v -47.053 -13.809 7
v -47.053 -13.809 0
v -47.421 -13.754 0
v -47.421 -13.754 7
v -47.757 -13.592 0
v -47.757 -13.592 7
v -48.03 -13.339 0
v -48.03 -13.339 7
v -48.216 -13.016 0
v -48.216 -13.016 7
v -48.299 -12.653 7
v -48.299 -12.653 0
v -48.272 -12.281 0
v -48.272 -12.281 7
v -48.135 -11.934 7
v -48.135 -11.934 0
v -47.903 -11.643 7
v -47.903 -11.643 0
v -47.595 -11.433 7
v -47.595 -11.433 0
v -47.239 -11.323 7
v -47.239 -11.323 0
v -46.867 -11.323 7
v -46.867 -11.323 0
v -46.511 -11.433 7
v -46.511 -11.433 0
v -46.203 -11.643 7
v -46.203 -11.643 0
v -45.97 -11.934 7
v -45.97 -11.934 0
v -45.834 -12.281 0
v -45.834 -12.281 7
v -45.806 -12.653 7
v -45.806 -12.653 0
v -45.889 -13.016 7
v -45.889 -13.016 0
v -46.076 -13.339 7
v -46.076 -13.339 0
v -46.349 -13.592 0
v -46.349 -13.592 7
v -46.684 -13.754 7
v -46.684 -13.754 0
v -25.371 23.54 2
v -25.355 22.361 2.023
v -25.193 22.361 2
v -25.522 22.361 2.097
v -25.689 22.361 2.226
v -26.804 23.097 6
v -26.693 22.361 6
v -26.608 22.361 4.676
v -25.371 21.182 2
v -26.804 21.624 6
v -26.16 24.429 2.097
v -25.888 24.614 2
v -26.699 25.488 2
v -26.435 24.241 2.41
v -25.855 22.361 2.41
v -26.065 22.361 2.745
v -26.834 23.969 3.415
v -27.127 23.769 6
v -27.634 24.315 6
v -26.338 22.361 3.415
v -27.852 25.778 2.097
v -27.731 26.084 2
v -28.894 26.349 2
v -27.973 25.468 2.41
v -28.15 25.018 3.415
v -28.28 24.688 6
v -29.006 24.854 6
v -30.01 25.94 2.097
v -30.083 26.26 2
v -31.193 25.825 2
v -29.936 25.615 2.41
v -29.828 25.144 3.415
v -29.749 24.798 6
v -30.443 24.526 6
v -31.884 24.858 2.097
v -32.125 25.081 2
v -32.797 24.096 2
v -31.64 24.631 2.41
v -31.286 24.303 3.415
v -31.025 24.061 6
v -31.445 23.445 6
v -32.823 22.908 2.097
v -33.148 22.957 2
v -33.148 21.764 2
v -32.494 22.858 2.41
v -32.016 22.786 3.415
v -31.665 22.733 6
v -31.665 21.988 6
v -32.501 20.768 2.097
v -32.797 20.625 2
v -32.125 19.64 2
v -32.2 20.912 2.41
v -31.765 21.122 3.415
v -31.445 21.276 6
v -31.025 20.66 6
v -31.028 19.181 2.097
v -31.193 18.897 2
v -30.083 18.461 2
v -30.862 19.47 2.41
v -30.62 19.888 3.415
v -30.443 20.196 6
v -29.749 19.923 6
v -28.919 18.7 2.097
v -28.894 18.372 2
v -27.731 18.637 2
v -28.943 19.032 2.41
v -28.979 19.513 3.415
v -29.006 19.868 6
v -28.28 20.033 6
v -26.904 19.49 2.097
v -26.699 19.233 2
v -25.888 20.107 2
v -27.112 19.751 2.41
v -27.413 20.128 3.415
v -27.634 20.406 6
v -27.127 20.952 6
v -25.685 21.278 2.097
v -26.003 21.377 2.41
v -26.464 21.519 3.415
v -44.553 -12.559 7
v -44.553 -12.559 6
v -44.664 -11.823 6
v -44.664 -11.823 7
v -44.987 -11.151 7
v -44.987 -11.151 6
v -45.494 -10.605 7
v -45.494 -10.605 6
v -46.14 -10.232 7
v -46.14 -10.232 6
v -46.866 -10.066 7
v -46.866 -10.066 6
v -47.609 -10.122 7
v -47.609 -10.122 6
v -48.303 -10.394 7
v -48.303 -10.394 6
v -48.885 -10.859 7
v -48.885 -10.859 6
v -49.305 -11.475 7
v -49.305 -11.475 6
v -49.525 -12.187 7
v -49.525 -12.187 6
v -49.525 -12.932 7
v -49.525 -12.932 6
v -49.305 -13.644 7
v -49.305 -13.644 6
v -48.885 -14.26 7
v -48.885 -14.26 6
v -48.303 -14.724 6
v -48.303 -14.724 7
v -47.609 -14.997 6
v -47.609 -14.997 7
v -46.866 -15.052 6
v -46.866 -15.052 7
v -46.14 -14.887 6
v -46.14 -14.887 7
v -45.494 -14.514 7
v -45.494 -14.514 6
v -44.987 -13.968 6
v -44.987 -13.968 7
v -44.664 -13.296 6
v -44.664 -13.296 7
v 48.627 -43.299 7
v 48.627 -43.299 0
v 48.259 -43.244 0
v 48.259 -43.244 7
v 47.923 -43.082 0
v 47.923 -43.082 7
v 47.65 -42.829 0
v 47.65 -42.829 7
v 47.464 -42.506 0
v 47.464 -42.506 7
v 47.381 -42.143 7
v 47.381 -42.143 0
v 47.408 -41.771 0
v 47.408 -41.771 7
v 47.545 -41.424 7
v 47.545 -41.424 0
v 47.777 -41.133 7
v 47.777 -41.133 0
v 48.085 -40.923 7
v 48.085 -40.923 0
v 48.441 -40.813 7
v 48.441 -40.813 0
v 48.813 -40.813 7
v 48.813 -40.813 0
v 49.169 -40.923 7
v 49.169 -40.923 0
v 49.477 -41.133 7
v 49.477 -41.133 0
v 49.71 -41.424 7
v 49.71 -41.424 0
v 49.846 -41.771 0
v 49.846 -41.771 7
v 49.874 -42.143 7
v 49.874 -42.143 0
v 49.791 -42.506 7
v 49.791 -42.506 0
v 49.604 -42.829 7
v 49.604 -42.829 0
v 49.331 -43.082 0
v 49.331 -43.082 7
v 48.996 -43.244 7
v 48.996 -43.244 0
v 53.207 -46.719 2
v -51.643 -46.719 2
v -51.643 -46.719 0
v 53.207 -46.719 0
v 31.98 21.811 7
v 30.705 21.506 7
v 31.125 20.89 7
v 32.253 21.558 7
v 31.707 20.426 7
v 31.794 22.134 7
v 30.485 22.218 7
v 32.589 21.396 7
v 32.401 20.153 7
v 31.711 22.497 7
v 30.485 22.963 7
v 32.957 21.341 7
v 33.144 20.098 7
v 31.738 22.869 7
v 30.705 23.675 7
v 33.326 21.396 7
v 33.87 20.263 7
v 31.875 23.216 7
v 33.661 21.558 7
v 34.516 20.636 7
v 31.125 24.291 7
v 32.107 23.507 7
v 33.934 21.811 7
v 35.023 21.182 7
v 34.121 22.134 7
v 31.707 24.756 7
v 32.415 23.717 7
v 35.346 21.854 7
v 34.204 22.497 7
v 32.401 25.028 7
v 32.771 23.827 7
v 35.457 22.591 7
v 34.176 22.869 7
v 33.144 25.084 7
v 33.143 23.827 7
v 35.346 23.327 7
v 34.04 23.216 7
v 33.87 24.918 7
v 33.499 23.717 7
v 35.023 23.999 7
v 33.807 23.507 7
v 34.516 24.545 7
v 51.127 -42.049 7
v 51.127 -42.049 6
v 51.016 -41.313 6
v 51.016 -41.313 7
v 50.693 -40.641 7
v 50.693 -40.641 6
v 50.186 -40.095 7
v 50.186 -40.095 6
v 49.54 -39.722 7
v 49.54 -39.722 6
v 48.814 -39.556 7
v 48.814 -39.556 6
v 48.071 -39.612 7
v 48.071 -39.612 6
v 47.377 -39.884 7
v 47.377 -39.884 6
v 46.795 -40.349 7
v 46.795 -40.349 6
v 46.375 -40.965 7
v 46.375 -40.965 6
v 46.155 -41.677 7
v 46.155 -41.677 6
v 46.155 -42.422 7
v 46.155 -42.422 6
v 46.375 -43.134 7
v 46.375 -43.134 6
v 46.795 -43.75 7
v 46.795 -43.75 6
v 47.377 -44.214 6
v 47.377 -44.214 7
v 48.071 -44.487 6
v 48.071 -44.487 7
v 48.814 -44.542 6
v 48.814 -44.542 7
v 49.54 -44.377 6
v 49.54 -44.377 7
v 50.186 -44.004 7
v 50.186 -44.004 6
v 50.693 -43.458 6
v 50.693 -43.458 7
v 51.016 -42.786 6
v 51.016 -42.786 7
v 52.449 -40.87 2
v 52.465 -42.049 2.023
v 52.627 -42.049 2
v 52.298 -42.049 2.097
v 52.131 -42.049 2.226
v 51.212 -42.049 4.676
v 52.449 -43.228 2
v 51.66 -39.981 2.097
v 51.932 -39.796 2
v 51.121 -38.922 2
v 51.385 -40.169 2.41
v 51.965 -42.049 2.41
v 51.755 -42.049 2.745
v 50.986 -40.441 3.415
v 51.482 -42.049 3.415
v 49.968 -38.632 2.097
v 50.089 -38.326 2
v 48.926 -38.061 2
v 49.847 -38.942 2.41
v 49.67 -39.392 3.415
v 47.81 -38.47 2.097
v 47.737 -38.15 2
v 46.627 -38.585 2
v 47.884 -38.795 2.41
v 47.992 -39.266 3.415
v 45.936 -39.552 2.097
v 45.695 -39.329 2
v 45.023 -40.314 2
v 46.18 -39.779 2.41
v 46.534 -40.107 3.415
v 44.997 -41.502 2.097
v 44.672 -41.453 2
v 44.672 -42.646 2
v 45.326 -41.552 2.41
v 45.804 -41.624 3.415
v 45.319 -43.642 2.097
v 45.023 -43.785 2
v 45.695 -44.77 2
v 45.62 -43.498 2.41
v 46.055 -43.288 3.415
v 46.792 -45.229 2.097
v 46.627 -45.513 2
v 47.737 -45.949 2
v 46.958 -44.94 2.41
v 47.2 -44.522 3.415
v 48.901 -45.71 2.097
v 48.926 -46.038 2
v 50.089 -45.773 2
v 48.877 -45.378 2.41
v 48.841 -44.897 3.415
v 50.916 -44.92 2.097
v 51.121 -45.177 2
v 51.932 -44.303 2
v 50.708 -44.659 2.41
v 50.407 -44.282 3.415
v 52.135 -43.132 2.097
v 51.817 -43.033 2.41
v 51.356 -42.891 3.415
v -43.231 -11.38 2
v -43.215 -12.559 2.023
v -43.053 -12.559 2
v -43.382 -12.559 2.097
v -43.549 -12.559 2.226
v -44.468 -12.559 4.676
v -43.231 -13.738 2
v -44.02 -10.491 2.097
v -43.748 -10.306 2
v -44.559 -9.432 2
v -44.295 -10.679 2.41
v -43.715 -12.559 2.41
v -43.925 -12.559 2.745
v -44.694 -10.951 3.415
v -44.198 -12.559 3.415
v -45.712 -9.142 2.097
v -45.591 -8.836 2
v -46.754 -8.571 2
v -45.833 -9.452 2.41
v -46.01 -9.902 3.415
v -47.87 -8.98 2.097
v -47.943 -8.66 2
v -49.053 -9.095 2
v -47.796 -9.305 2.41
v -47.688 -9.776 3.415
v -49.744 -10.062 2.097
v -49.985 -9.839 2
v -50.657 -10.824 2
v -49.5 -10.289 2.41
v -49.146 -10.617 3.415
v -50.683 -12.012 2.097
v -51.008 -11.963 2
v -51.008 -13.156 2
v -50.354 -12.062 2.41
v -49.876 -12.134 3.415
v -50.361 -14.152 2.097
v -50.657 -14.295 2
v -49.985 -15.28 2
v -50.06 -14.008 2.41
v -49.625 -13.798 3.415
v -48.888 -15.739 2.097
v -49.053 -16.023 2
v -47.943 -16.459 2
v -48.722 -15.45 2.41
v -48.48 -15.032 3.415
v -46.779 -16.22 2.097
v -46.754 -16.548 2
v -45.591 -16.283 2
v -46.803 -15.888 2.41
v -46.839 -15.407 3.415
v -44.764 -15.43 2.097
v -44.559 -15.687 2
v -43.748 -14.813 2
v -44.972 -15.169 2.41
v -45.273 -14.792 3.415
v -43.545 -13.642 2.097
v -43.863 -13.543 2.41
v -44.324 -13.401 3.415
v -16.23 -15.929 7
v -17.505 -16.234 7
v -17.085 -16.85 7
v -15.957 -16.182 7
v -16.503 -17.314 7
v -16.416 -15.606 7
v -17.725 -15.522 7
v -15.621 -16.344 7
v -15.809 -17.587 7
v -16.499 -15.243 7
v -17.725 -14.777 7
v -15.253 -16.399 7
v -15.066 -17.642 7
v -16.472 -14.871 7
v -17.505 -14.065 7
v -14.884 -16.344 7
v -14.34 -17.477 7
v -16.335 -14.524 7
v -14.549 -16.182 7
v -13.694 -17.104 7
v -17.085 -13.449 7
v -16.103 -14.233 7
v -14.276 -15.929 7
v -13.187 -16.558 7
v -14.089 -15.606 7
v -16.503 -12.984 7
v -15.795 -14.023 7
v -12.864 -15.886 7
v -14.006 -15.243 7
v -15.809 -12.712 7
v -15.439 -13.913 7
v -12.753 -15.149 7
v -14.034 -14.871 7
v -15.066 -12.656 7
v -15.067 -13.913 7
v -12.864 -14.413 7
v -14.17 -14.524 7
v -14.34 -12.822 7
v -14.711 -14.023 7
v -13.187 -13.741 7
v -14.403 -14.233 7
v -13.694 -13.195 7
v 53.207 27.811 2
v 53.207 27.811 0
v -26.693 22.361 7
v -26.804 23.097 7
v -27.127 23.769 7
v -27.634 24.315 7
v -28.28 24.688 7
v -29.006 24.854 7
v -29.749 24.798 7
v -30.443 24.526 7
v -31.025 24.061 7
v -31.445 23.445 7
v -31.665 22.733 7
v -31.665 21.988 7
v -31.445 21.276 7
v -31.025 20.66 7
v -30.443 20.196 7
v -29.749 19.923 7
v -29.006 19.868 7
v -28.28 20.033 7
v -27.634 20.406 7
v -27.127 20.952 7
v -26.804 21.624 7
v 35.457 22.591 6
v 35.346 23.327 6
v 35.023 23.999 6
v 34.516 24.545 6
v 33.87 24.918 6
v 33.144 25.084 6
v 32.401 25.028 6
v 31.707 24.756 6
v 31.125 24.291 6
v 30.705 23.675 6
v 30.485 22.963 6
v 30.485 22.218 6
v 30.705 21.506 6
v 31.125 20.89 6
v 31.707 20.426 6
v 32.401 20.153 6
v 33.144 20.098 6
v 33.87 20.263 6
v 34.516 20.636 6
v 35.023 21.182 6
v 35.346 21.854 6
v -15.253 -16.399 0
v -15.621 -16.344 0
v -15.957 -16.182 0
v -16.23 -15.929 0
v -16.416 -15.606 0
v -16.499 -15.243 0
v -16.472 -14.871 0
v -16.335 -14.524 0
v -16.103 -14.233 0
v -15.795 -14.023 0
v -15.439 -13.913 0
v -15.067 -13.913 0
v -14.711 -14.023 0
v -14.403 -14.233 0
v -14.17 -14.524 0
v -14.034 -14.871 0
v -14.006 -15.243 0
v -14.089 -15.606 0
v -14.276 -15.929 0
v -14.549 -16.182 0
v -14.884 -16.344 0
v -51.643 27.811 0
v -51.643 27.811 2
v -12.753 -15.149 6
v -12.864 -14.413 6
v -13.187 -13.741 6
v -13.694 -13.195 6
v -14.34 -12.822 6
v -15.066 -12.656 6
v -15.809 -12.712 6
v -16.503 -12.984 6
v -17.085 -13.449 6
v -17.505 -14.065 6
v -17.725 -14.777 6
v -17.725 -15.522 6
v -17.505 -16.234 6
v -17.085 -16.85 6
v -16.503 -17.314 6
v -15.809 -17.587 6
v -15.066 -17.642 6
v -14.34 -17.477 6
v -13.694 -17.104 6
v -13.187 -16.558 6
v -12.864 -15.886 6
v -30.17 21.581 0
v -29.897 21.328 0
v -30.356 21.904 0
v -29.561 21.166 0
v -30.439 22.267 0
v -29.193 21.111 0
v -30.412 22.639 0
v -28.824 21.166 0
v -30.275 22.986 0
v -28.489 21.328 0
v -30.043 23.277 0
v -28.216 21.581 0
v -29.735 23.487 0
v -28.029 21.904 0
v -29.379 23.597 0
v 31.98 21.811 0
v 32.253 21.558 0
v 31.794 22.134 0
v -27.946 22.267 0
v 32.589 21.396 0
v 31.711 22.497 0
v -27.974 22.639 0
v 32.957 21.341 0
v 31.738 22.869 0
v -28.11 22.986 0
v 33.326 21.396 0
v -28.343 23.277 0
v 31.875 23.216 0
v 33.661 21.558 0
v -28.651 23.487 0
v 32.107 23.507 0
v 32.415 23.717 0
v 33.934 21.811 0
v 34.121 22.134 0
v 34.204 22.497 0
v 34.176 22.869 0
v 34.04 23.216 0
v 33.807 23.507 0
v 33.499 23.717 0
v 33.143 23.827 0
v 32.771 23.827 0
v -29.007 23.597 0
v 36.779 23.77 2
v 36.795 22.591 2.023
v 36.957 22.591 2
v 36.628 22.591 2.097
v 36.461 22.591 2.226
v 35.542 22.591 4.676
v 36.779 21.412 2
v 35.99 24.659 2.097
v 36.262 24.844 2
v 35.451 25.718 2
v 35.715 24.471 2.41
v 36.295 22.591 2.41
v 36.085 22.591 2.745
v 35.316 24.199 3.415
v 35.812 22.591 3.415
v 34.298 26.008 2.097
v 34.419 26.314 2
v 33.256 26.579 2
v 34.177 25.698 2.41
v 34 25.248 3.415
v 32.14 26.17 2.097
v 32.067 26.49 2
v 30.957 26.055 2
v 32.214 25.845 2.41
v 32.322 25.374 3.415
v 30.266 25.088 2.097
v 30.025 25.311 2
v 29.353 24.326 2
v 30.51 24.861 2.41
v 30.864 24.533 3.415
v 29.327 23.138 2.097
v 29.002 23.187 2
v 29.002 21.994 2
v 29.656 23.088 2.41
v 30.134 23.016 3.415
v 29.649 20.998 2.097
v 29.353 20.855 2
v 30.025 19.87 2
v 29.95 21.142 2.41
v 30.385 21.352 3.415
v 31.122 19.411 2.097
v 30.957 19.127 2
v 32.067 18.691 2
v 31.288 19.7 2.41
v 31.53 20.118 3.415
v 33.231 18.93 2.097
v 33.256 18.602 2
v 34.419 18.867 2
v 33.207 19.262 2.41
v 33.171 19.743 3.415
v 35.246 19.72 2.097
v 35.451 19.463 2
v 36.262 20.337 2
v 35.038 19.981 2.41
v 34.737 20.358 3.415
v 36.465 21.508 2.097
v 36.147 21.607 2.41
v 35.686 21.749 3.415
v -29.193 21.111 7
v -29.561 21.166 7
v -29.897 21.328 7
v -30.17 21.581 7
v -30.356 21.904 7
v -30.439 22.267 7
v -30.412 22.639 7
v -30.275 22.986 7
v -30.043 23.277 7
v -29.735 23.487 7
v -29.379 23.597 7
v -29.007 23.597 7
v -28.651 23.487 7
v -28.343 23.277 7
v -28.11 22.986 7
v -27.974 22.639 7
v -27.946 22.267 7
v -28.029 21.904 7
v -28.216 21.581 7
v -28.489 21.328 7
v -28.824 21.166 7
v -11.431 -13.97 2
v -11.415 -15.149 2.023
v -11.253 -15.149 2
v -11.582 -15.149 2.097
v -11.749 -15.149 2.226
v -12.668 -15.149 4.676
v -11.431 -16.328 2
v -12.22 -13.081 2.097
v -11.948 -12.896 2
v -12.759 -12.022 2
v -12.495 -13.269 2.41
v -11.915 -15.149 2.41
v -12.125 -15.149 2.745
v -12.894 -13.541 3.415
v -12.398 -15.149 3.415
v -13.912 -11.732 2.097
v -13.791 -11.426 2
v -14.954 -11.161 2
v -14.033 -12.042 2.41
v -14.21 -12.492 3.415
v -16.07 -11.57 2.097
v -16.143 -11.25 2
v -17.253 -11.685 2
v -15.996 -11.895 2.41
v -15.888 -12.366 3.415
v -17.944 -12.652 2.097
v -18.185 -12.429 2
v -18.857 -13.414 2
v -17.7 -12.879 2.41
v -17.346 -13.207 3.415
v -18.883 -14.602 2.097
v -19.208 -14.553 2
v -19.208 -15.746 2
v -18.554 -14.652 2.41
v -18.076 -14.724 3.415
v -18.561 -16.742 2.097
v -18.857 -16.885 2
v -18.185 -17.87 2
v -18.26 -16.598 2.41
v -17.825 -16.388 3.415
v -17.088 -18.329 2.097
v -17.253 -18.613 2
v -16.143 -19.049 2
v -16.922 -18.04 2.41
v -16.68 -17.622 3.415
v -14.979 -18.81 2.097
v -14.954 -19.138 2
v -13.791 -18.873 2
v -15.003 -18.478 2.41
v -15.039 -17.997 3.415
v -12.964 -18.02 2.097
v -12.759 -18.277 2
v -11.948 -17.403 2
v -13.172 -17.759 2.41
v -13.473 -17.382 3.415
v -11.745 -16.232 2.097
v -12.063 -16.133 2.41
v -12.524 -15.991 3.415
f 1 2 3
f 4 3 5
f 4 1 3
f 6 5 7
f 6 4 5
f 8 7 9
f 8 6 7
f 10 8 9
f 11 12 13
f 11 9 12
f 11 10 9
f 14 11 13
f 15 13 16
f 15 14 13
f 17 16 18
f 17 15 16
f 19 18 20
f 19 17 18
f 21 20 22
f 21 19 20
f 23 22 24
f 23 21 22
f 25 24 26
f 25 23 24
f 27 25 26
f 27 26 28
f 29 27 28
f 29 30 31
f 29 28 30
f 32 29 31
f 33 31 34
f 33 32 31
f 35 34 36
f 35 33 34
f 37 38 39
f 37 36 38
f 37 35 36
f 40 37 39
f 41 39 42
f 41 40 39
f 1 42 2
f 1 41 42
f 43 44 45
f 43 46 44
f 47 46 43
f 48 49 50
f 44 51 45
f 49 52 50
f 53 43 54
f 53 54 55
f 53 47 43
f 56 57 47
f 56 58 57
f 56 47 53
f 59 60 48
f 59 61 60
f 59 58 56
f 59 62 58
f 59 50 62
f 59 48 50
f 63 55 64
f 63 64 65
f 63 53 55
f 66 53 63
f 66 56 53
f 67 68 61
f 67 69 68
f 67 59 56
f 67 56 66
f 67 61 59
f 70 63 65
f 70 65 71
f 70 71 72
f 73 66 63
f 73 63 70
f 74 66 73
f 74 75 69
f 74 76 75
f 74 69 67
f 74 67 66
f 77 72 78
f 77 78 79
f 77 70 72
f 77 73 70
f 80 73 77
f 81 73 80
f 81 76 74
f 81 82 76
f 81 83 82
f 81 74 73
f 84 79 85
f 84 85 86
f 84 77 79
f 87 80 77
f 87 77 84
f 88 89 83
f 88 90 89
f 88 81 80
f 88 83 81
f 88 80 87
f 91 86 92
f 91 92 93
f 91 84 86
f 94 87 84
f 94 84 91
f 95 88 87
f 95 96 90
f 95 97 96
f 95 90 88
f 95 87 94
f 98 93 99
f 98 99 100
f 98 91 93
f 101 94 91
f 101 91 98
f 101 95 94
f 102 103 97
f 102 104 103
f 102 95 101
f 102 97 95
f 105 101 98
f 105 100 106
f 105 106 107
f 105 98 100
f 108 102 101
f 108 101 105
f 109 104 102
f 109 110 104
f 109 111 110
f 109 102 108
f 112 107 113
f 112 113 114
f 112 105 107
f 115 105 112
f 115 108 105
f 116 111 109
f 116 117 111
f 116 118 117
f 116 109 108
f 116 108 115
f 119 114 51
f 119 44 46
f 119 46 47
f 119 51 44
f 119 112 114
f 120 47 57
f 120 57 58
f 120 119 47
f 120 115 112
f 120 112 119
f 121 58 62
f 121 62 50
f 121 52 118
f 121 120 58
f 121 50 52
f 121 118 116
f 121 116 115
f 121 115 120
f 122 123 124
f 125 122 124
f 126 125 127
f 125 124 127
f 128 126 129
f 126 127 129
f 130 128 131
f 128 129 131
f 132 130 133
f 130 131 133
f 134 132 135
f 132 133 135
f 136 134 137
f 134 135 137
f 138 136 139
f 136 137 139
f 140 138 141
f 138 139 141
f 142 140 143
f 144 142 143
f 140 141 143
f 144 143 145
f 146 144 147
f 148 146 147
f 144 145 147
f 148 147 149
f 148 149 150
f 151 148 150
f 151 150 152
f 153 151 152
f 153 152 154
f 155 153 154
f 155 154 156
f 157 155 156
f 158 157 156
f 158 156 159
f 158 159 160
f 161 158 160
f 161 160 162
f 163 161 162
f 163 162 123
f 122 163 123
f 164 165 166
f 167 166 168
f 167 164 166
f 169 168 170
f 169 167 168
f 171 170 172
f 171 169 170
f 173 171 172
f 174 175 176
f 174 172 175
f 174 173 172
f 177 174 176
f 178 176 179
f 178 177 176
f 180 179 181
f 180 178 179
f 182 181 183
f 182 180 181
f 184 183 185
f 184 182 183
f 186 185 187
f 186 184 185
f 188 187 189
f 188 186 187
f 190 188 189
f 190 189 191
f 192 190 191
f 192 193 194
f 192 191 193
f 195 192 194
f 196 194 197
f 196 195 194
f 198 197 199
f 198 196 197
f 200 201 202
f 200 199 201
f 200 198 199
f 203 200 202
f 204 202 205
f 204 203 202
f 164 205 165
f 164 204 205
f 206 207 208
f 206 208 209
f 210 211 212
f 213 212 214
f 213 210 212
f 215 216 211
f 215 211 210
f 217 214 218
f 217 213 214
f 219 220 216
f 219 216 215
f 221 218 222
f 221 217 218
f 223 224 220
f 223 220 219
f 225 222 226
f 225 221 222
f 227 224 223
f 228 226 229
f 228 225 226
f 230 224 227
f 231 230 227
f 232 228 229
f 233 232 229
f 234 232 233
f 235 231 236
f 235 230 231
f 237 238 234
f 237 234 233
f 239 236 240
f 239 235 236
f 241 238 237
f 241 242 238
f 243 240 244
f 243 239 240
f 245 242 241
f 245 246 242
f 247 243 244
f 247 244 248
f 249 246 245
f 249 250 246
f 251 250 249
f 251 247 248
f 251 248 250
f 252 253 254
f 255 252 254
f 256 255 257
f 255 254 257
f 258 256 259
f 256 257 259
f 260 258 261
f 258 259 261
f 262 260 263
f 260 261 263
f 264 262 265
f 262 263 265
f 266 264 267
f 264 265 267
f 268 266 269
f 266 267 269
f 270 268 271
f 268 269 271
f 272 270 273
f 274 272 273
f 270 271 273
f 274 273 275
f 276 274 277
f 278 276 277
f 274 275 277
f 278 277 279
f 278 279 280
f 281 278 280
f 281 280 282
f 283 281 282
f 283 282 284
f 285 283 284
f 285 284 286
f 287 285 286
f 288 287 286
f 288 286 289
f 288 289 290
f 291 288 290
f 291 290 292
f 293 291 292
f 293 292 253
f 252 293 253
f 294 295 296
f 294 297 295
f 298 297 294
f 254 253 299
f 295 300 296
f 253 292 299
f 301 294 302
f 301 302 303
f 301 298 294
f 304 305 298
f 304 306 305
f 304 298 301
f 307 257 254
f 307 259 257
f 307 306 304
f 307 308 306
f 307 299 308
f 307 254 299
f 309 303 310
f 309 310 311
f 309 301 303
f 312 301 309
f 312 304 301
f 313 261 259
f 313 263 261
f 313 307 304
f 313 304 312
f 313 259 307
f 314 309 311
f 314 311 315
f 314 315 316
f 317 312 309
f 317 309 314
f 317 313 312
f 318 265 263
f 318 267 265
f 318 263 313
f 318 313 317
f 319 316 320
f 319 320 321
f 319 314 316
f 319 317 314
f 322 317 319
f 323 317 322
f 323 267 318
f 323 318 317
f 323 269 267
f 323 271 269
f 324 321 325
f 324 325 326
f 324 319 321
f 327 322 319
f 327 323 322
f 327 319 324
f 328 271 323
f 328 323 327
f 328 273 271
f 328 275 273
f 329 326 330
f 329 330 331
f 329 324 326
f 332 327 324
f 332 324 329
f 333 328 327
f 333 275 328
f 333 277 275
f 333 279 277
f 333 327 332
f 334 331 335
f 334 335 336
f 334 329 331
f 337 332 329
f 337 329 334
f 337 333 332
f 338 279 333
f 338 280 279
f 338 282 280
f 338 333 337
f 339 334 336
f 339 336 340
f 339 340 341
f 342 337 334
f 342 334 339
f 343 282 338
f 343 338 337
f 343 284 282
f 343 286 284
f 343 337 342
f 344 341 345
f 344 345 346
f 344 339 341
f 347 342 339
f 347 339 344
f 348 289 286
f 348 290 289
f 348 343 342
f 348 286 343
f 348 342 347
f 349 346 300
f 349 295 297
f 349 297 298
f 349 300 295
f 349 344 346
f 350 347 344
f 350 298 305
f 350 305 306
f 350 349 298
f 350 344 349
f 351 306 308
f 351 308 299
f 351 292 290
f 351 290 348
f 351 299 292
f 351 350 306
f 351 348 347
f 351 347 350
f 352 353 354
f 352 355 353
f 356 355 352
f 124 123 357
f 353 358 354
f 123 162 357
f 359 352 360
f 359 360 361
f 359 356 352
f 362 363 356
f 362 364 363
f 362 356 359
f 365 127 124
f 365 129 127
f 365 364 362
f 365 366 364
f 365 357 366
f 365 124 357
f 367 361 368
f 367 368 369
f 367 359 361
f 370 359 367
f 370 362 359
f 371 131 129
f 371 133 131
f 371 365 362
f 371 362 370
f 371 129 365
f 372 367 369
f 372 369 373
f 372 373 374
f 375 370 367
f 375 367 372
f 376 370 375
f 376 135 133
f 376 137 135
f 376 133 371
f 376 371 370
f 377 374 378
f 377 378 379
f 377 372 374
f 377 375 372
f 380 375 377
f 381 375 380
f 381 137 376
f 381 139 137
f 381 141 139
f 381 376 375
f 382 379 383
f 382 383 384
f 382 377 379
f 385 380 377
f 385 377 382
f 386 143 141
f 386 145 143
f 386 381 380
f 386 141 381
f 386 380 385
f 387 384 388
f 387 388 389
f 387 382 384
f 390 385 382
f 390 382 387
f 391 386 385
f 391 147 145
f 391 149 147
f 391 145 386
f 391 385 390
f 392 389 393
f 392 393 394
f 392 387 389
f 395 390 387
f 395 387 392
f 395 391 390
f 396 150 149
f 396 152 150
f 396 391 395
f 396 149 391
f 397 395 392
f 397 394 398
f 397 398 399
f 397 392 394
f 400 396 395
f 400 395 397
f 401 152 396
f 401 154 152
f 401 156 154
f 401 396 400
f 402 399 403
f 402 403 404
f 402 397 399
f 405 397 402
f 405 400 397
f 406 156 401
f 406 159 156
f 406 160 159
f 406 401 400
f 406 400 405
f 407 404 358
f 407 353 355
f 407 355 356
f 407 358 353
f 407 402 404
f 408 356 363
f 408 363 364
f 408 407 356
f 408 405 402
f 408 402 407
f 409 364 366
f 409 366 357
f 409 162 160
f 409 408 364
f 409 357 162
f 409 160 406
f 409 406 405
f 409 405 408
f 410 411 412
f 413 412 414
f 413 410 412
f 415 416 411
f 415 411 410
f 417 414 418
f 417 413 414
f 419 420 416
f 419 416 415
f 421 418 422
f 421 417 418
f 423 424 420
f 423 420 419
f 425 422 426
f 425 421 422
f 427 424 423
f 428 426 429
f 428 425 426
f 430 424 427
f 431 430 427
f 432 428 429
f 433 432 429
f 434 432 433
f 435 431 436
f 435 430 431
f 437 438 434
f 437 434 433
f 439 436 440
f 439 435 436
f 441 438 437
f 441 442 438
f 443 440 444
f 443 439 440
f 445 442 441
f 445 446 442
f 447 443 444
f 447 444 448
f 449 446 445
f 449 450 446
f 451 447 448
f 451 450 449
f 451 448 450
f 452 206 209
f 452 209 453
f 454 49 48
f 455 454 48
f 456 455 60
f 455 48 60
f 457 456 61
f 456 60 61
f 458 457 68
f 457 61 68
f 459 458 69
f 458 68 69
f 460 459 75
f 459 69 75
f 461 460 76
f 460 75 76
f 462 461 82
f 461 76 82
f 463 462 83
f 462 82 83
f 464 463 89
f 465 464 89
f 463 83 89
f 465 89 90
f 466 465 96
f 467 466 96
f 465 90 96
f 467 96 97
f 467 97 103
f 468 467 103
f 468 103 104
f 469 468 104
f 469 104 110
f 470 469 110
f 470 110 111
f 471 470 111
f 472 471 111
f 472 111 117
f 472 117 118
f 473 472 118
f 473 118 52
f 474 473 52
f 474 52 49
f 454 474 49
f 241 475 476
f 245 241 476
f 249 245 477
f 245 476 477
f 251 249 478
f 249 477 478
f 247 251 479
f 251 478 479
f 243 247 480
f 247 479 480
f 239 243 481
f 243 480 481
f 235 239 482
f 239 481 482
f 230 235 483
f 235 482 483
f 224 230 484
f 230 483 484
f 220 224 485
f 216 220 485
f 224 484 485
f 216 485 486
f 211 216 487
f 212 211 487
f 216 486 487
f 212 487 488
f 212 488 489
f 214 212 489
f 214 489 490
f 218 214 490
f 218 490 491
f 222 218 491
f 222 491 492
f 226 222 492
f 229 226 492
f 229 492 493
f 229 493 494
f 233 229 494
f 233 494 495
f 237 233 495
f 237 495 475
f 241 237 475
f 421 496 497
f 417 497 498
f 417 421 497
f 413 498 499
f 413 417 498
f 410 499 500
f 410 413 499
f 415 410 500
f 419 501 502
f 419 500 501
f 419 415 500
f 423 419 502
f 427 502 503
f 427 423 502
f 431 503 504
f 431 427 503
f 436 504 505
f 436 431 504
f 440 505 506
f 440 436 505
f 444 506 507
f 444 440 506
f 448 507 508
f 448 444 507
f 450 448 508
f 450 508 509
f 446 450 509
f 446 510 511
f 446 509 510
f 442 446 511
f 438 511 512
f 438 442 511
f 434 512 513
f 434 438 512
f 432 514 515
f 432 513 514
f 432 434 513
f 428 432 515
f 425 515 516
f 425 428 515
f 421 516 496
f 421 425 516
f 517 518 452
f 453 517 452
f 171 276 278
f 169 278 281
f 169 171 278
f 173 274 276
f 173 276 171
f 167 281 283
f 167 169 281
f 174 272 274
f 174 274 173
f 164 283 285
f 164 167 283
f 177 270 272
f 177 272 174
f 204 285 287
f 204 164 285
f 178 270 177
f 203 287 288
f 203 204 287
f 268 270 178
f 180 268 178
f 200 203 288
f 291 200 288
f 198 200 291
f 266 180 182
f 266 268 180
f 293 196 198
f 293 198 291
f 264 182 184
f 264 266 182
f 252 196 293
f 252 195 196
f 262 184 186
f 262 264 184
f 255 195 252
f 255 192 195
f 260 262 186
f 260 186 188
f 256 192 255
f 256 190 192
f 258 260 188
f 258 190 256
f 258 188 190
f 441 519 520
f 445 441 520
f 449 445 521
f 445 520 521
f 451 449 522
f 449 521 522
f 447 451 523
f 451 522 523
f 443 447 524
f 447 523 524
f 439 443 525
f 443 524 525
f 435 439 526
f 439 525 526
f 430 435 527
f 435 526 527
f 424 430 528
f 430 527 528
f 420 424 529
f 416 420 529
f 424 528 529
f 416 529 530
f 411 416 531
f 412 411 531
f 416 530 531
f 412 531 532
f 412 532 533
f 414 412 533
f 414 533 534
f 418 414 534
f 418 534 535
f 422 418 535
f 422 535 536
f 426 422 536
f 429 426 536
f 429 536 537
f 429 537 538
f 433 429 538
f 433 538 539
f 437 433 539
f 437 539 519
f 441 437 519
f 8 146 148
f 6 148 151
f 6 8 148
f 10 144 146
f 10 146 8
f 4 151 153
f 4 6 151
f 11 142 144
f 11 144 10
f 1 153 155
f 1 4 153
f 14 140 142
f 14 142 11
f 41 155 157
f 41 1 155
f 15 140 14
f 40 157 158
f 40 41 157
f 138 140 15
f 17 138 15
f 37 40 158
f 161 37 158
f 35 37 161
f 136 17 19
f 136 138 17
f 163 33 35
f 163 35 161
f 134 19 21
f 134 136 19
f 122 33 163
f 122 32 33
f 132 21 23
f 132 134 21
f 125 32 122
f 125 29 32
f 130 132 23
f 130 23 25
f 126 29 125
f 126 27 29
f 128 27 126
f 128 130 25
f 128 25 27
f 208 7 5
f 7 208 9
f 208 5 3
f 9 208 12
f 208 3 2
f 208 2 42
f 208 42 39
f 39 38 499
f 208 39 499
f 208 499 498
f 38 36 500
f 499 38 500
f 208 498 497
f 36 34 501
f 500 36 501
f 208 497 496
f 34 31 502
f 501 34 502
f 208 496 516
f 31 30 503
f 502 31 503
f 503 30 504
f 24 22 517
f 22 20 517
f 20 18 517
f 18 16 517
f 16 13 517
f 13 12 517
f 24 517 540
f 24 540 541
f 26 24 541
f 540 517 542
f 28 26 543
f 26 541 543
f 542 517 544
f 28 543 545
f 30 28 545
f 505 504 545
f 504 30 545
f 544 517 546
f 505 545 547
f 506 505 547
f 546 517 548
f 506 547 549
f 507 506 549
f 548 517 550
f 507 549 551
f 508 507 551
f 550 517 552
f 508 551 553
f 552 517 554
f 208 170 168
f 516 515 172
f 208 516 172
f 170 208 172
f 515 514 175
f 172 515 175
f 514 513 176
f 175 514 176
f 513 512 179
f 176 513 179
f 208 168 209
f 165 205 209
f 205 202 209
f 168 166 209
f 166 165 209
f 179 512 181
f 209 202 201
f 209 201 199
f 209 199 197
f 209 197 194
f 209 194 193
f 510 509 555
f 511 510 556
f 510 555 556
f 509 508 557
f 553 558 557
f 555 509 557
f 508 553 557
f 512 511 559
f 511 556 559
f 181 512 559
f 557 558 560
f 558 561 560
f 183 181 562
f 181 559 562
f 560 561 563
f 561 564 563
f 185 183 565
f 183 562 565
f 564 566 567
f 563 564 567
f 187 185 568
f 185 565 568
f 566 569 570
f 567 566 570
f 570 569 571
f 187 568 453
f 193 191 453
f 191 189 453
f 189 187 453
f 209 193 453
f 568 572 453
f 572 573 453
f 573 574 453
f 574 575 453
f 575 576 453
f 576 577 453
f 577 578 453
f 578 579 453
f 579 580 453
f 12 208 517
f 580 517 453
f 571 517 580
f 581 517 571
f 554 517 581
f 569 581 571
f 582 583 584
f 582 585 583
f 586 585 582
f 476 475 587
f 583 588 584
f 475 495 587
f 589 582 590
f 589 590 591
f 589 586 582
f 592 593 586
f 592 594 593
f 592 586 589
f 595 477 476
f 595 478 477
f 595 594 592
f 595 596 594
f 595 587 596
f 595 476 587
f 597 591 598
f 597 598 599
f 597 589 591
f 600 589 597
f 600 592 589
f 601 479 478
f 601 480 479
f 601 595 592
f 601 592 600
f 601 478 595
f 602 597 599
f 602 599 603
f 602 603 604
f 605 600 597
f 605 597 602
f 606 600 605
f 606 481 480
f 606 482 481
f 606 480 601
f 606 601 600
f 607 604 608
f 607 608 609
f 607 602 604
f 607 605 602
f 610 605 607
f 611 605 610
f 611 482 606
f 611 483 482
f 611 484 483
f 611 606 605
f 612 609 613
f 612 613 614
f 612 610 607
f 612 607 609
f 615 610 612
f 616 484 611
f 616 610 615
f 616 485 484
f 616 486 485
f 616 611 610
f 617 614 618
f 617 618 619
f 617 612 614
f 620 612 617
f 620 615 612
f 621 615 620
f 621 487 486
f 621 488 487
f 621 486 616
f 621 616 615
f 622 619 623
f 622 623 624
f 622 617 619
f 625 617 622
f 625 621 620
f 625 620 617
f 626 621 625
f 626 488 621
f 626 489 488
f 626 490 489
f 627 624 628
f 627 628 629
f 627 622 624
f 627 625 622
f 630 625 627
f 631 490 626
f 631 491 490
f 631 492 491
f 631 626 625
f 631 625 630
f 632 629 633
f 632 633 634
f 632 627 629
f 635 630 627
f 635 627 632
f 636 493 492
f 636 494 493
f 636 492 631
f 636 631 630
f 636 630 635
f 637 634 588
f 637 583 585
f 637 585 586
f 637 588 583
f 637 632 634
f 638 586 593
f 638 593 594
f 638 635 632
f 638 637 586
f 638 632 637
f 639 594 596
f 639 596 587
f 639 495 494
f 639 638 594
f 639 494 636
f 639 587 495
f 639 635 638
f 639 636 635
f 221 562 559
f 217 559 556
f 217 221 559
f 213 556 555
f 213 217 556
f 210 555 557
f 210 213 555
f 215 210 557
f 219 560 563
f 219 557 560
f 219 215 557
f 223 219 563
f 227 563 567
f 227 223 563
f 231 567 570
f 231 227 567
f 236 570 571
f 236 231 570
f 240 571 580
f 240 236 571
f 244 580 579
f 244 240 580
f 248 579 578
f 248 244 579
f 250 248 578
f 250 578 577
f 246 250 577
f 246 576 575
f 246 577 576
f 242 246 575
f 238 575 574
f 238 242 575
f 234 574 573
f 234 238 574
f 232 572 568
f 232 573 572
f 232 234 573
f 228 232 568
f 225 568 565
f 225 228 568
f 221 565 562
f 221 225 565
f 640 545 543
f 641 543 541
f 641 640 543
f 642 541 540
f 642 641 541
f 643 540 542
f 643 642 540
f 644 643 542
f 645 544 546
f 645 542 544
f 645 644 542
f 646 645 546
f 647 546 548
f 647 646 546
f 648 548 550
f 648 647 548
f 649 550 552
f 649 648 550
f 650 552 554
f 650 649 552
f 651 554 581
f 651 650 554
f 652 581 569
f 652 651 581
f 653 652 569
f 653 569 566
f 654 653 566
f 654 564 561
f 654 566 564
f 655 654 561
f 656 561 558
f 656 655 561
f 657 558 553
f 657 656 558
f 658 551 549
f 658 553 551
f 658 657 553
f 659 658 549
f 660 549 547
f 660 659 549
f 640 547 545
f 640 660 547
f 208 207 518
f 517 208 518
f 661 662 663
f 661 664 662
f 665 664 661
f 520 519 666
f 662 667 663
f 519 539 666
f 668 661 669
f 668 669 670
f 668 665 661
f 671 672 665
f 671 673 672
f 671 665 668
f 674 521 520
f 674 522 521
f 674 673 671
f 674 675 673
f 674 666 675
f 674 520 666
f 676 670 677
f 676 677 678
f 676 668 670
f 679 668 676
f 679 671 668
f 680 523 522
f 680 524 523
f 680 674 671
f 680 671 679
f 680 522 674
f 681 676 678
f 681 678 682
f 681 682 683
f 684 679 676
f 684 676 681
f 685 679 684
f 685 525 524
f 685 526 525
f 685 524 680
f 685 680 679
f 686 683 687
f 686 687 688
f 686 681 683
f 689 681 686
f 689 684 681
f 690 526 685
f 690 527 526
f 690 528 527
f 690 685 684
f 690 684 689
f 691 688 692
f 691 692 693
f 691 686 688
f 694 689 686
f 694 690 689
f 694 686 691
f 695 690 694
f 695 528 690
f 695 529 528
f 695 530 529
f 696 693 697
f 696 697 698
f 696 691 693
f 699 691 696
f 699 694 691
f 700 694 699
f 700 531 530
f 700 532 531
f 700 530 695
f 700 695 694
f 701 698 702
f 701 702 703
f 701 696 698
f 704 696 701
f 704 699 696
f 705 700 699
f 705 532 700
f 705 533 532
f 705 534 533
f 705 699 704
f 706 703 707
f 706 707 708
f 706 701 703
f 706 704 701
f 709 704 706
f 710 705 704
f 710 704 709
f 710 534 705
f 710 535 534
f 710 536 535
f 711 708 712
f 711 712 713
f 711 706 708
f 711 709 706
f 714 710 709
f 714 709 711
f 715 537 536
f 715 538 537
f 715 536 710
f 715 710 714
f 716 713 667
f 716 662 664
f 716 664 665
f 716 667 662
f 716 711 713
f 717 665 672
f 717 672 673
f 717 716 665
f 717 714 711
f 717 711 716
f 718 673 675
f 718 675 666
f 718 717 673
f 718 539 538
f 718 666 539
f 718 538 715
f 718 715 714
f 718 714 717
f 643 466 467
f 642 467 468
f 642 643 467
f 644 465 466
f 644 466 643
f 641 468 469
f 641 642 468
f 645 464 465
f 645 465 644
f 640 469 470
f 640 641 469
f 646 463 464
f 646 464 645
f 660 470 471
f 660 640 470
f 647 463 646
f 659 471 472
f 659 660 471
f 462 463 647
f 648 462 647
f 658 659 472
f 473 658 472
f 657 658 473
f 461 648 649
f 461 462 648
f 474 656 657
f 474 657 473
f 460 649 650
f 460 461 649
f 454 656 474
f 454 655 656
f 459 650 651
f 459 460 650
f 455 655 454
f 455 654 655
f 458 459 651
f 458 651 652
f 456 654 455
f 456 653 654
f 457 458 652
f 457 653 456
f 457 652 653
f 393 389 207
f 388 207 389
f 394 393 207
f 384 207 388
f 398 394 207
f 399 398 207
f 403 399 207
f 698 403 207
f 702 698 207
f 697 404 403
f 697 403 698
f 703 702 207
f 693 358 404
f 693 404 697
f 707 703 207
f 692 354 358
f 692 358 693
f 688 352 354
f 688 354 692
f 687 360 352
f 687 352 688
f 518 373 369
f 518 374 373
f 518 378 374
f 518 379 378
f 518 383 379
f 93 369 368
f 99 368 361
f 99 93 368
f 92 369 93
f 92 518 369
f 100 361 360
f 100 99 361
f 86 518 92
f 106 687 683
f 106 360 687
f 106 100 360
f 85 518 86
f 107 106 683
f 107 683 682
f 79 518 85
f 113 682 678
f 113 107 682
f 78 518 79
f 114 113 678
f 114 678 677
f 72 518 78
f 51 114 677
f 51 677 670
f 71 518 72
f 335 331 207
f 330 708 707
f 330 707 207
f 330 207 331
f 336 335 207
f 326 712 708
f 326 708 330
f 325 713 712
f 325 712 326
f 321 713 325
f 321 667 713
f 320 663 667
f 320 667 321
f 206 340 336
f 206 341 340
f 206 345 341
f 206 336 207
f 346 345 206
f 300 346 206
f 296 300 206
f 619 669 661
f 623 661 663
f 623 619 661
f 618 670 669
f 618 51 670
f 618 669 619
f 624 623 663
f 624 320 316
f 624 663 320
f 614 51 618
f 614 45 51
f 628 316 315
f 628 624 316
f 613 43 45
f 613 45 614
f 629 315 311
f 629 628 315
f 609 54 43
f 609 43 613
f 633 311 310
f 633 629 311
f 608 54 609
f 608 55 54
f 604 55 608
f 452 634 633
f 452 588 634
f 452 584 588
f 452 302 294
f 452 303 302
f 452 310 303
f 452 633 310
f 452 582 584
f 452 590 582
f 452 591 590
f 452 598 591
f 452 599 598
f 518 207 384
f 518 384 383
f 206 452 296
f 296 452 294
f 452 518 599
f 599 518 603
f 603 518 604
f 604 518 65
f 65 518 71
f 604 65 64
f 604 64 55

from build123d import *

# Parameters (mm, degrees)
SKETCH1_W           = 100.85
SKETCH1_H           = 70.53
BOSS_EXTRUDE1_DEPTH = 2
SKETCH6_W           = 104.85
SKETCH6_H           = 74.53
BOSS_EXTRUDE3_DEPTH = 2
SKETCH3_R           = 2.5
BOSS_EXTRUDE2_DEPTH = 5
FILLET1_SIZE        = 1.5
FILLET1_SIZE_2      = 4


with BuildPart() as part:
    # Sketch1 → Boss-Extrude1 (new body)
    with BuildSketch(Plane.XY):
        with Locations((0.782139599, -9.454393248)):
            Rectangle(SKETCH1_W, SKETCH1_H)
    extrude(amount=BOSS_EXTRUDE1_DEPTH)

    # Sketch6 → Boss-Extrude3 (add)
    with BuildSketch(Plane.XY.offset(2)):
        with Locations((0.782139599, -9.454393248)):
            Rectangle(SKETCH6_W, SKETCH6_H)
    extrude(amount=-BOSS_EXTRUDE3_DEPTH)

    # Sketch3 → Boss-Extrude2 (add)
    with BuildSketch(Plane.XY.offset(2)):
        with Locations((-29.192860401, 22.360606752)):
            Circle(SKETCH3_R)
    boss_extrude2 = extrude(amount=BOSS_EXTRUDE2_DEPTH)

    # Sketch5 → Tap Drill for M3x0.5 Tap1 (revolve, cut)
    with BuildSketch(Plane(origin=(-29.192860401, 22.360606752, 7), x_dir=(0, -1, 0), z_dir=(1, 0, 0))):
        Polygon((0, 0), (0, 10.751075774), (1.25, 10), (1.25, 0), align=None)
    tap_drill_for_m3x0_5_tap1 = revolve(axis=Axis((-29.192860401, 22.360606752, 13.35), (0, 0, -1)), mode=Mode.SUBTRACT)

    # Sketch-Pattern1: Boss-Extrude2, Tap Drill for M3x0.5 Tap1 at 4 more places
    with Locations((-17.86, -34.92, 0), (13.94, -37.51, 0), (77.82, -64.41, 0), (62.15, 0.23, 0)):
        add(boss_extrude2)
        add(tap_drill_for_m3x0_5_tap1, mode=Mode.SUBTRACT)

    # Fillet1
    # an asymmetric fillet: 4, 1.5 mm, written as the material it adds along each edge
    with BuildSketch(Plane(origin=(-29.192860401, 22.360606752, 2), x_dir=(1, 0, 0), z_dir=(0, -1, 0))) as fillet1_piece_1:
        with BuildLine():
            Bezier((2.5 + FILLET1_SIZE, 0), (2.5, 0), (2.5, FILLET1_SIZE_2), weights=[1, 0.707106781, 1])
            Line((2.5, FILLET1_SIZE_2), (2.5, 0))
            Line((2.5, 0), (2.5 + FILLET1_SIZE, 0))
        make_face()
    revolve(axis=Axis((-29.192860401, 22.360606752, 2), (0, 0, 1)))
    with BuildSketch(Plane(origin=(-47.052860401, -12.559393248, 2), x_dir=(1, 0, 0), z_dir=(0, -1, 0))) as fillet1_piece_2:
        with BuildLine():
            Bezier((2.5 + FILLET1_SIZE, 0), (2.5, 0), (2.5, FILLET1_SIZE_2), weights=[1, 0.707106781, 1])
            Line((2.5, FILLET1_SIZE_2), (2.5, 0))
            Line((2.5, 0), (2.5 + FILLET1_SIZE, 0))
        make_face()
    revolve(axis=Axis((-47.052860401, -12.559393248, 2), (0, 0, 1)))
    with BuildSketch(Plane(origin=(-15.252860401, -15.149393248, 2), x_dir=(1, 0, 0), z_dir=(0, -1, 0))) as fillet1_piece_3:
        with BuildLine():
            Bezier((2.5 + FILLET1_SIZE, 0), (2.5, 0), (2.5, FILLET1_SIZE_2), weights=[1, 0.707106781, 1])
            Line((2.5, FILLET1_SIZE_2), (2.5, 0))
            Line((2.5, 0), (2.5 + FILLET1_SIZE, 0))
        make_face()
    revolve(axis=Axis((-15.252860401, -15.149393248, 2), (0, 0, 1)))
    with BuildSketch(Plane(origin=(48.627139599, -42.049393248, 2), x_dir=(1, 0, 0), z_dir=(0, -1, 0))) as fillet1_piece_4:
        with BuildLine():
            Bezier((2.5 + FILLET1_SIZE, 0), (2.5, 0), (2.5, FILLET1_SIZE_2), weights=[1, 0.707106781, 1])
            Line((2.5, FILLET1_SIZE_2), (2.5, 0))
            Line((2.5, 0), (2.5 + FILLET1_SIZE, 0))
        make_face()
    revolve(axis=Axis((48.627139599, -42.049393248, 2), (0, 0, 1)))
    with BuildSketch(Plane(origin=(32.957139599, 22.590606752, 2), x_dir=(1, 0, 0), z_dir=(0, -1, 0))) as fillet1_piece_5:
        with BuildLine():
            Bezier((2.5 + FILLET1_SIZE, 0), (2.5, 0), (2.5, FILLET1_SIZE_2), weights=[1, 0.707106781, 1])
            Line((2.5, FILLET1_SIZE_2), (2.5, 0))
            Line((2.5, 0), (2.5 + FILLET1_SIZE, 0))
        make_face()
    revolve(axis=Axis((32.957139599, 22.590606752, 2), (0, 0, 1)))


solid = part.part
